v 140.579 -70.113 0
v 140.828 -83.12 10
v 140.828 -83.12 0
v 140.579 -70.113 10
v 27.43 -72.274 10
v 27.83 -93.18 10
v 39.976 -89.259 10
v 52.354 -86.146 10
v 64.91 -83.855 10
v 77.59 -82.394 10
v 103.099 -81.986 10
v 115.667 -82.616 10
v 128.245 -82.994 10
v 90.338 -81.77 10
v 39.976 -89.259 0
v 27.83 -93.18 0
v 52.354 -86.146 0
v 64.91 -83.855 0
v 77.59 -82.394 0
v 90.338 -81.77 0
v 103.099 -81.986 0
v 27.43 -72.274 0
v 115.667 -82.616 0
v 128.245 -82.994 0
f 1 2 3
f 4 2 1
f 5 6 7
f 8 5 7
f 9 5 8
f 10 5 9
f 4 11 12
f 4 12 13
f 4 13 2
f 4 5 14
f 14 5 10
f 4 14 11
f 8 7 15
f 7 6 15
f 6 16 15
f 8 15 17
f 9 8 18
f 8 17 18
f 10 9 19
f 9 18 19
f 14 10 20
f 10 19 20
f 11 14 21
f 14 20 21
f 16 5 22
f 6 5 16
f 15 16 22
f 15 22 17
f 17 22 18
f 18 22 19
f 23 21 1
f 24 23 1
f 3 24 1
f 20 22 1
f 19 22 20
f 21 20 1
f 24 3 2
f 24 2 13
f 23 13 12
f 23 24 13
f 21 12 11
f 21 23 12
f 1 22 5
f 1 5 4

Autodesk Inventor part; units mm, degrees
ref_plane "YZ Plane" through (0, 0, 0) normal (1, 0, 0) x (0, 1, 0)
ref_plane "XZ Plane" through (0, 0, 0) normal (0, 1, 0) x (-1, 0, 0)
ref_plane "XY Plane" through (0, 0, 0) normal (0, 0, 1) x (1, 0, 0)
sketch "Sketch1" plane through (0, 0, 0) normal (0, 0, 1) x (1, 0, 0)
  line L0 (0, 0) -> (293.4944, 0) construction
  line L1 (293.4944, 0) -> (293.4944, -132.0217) construction
  line L2 (293.4944, -132.0217) -> (0, -132.0217) construction
  line L3 (0, -132.0217) -> (0, 0) construction
  line L4 (79.3681, -56.3049) -> (159.3681, -56.3049) construction
  line L5 (283.1562, -93.1287) -> (274.2161, -88.6482) construction
  line L6 (283.1562, -93.1287) -> (282.3201, -93.1287) construction
  line L7 (18.3483, -97.5091) -> (27.4302, -93.3236) construction
  line L8 (18.3483, -97.5091) -> (20.5956, -97.5091) construction
  arc A0 (103.0994, -81.9859) -> (27.4302, -93.3236) centre (93.4367, -275.677) ccw
  arc A1 (274.2161, -88.6482) -> (204.4098, -79.893) centre (217.7822, -255.937) ccw
  arc A2 (103.0994, -81.9859) -> (204.4098, -79.893) centre (140.8276, 544.7964) ccw
  line L9 (27.4302, -93.3236) -> (27.4302, -72.2735)
  line L10 (27.4302, -72.2735) -> (272.6166, -67.591)
  line L11 (272.6166, -67.591) -> (274.2161, -88.6482)
  line L12 (103.0994, -81.9859) -> (86.3195, -71.1488) construction
  line L13 (204.4098, -79.893) -> (220.9707, -68.5773) construction
  line L14 (86.3195, -71.1488) -> (86.3195, -81.1488) construction
  line L15 (86.3195, -81.1488) -> (103.0994, -81.9859) construction
  line L16 (220.9707, -68.5773) -> (221.7303, -78.5773) construction
  line L17 (221.7303, -78.5773) -> (204.4098, -79.893) construction
  dimension "d5" = 80
  dimension "d85" = 10
  dimension "d87" = 26.619
  dimension "d92" = 10
  dimension "d94" = 24.743
  dimension "d100" = 22.985
  dimension "d101" = 22.755
  dimension "d106" = 10
  dimension "d111" = 10
  dimension "d112" = 30
  dimension "d113" = 30
extrude "Extrusion1" add sketch "Sketch1" along normal blind 10
sketch "Sketch2" plane through (0, 0, 10) normal (0, 0, 1) x (1, 0, 0)
  arc A0 (103.0994, -81.9859) -> (204.4098, -79.893) centre (140.8276, 544.7964) ccw projected
  line L0 (272.6166, -67.591) -> (27.4302, -72.2735) projected
  line L1 (27.4302, -72.2735) -> (27.4302, -93.3236) projected
  line L2 (274.2161, -88.6482) -> (272.6166, -67.591) projected
  line L3 (125.3768, -83.1204) -> (158.7723, -83.1204)
  line L4 (140.8276, -83.1204) -> (140.8276, -70.1078)
  line L5 (140.8276, -76.6141) -> (27.4302, -76.6141)
  line L6 (140.8276, -76.6141) -> (273.302, -76.6141)
  arc A1 (274.2161, -88.6482) -> (204.4098, -79.893) centre (217.7822, -255.937) ccw projected
  line L7 (274.2161, -88.6482) -> (272.6166, -67.591) projected
  line L8 (272.6166, -67.591) -> (27.4302, -72.2735) projected
  line L9 (27.4302, -72.2735) -> (27.4302, -93.3236) projected
  arc A2 (103.0994, -81.9859) -> (27.4302, -93.3236) centre (93.4367, -275.677) ccw projected
  arc A3 (103.0994, -81.9859) -> (204.4098, -79.893) centre (140.8276, 544.7964) ccw projected
  line L10 (140.8276, -83.1204) -> (140.4575, -63.7401)
  point P0 (0, 0)
  point P1 (204.4098, -79.893)
  point P2 (140.5792, -70.1126)
  point P3 (140.7034, -76.6141)
  dimension "d121" = 113.3974
  dimension "d122" = 132.4743
extrude "Extrusion2" cut sketch "Sketch2" against normal blind 10 contours L4 L6 L2 A1 A0 | L10 L5 L4 | L5 L10 L0 L4 | L4 L0 L2 L6
sketch "Sketch4" plane through (0, 0, 10) normal (0, 0, 1) x (1, 0, 0)
  line L0 (140.5792, -70.1126) -> (27.4302, -72.2735) projected
  line L1 (27.4302, -72.2735) -> (27.4302, -93.3236) projected
  arc A0 (103.0994, -81.9859) -> (27.4302, -93.3236) centre (93.4367, -275.677) ccw projected
  arc A1 (103.0994, -81.9859) -> (140.8276, -83.1204) centre (140.8276, 544.7964) ccw projected
  line L2 (27.4302, -72.2735) -> (27.4302, -93.3236) projected
  arc A2 (103.0994, -81.9859) -> (27.4302, -93.3236) centre (93.4367, -275.677) ccw projected
  line L3 (27.4302, -72.2735) -> (27.8295, -93.1796)
  line L4 (140.8276, -83.1204) -> (140.5792, -70.1126) projected
  point P0 (0, 0)
  point P1 (253.7282, -67.9517)
  dimension "d128" = 90
extrude "Extrusion4" cut sketch "Sketch4" against normal blind 10 contours L3 A0 L1
equation "\"d111\" = d106"
equation "\"d113\" = d112"
properties part number "deseczka_dol_check"
